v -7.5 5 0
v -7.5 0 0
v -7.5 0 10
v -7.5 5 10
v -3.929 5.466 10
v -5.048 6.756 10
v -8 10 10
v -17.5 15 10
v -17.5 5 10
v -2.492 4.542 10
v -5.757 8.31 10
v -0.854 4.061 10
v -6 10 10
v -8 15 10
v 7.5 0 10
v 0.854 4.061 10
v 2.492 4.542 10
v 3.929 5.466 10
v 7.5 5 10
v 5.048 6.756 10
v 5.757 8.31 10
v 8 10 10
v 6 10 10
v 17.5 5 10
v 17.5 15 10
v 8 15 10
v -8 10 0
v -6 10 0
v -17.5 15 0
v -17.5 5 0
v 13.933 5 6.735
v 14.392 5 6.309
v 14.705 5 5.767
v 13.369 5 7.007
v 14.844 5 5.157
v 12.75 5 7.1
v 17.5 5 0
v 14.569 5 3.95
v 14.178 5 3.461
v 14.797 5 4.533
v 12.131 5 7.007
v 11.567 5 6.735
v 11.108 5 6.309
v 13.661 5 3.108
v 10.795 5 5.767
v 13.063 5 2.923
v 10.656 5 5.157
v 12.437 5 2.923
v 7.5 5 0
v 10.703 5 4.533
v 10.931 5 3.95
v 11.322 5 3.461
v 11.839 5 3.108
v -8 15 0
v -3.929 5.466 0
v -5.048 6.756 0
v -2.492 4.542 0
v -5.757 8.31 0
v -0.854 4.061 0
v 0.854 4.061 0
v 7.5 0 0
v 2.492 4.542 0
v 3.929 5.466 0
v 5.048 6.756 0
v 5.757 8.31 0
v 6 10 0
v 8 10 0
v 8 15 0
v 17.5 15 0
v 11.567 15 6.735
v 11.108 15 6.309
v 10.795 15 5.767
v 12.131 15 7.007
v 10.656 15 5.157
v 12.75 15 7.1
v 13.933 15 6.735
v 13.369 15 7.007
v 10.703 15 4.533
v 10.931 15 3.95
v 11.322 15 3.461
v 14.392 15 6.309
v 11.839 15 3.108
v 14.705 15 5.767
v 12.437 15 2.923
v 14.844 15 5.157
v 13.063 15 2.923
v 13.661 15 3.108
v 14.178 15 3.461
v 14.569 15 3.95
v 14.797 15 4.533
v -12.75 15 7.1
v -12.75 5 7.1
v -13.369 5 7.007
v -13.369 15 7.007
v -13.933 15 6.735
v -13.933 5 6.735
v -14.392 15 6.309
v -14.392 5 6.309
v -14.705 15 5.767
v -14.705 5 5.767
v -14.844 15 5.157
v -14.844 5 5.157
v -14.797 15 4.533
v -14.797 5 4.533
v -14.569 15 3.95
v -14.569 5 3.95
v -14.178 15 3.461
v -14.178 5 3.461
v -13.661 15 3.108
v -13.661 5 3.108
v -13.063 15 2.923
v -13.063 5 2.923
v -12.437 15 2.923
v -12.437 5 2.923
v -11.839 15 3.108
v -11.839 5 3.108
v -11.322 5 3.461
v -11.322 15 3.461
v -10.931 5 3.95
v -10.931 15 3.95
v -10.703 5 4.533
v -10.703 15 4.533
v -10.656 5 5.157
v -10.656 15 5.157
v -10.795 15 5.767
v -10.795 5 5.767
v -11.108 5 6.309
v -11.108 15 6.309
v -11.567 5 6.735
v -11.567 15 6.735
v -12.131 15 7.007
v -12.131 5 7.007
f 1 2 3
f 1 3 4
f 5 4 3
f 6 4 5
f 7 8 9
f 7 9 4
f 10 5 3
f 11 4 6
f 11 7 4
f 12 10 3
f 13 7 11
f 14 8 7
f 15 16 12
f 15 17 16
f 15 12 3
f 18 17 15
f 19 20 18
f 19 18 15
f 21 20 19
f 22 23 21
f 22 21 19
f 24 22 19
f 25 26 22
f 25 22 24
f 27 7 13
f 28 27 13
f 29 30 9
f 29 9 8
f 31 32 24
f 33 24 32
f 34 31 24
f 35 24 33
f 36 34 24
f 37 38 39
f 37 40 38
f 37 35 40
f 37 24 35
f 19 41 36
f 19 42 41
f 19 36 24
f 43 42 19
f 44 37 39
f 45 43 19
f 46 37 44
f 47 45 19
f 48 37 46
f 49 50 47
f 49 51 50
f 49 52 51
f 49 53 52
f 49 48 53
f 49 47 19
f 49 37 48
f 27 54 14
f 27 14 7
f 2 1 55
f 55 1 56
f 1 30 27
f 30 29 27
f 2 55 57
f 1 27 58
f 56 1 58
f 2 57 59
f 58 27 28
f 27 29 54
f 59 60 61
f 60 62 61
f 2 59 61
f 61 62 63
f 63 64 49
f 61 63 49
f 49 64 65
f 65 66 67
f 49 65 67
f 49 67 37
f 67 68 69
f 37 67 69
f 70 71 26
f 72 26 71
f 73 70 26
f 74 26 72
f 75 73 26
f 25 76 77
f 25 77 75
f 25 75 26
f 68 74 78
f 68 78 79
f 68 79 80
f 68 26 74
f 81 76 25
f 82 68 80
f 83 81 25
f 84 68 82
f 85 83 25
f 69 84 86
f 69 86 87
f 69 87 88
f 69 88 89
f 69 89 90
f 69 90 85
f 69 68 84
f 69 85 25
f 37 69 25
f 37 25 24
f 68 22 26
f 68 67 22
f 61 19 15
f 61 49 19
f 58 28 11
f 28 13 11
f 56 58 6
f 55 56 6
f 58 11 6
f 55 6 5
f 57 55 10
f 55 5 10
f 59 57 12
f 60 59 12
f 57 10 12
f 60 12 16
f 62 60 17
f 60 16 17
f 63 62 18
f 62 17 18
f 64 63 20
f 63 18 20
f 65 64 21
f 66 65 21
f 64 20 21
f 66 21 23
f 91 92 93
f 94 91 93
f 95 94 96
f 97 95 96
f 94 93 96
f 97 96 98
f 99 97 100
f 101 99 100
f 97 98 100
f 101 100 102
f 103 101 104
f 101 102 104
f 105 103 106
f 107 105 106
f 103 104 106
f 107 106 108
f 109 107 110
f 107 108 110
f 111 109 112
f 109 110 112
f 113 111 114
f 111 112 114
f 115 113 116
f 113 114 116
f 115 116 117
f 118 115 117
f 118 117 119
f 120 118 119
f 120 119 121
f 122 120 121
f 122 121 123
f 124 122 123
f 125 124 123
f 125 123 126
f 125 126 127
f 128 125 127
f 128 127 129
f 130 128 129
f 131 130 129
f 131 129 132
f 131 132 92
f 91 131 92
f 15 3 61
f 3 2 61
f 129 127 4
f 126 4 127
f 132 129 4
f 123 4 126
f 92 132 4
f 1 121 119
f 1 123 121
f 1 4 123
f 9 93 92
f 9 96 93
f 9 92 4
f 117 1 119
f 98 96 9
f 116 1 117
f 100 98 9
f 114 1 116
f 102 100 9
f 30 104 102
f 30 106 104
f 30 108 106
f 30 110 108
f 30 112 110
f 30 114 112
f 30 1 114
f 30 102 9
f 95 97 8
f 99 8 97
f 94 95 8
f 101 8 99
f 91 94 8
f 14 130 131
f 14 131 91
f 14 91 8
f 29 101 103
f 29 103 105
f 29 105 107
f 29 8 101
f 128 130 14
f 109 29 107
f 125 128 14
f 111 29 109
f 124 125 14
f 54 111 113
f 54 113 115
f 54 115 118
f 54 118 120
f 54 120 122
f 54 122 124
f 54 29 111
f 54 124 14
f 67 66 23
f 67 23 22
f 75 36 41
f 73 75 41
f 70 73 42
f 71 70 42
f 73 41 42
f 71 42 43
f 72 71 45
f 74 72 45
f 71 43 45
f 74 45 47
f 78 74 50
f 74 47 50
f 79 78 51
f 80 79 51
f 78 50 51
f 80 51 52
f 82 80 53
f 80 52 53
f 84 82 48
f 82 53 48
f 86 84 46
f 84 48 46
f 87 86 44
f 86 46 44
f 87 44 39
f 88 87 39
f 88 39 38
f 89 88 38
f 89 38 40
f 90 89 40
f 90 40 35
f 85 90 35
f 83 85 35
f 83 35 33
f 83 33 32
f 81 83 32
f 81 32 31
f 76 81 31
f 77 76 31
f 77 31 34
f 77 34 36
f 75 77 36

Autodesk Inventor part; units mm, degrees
ref_plane "YZ Plane" through (0, 0, 0) normal (1, 0, 0) x (0, 1, 0)
ref_plane "XZ Plane" through (0, 0, 0) normal (0, 1, 0) x (-1, 0, 0)
ref_plane "XY Plane" through (0, 0, 0) normal (0, 0, 1) x (1, 0, 0)
sketch "Skizze1" plane through (0, 0, 0) normal (0, 0, 1) x (1, 0, 0)
  line L0 (-17.5, 5) -> (-17.5, 15)
  line L1 (-17.5, 15) -> (-8, 15)
  line L2 (-8, 15) -> (-8, 10)
  line L3 (-8, 10) -> (8, 10)
  line L4 (8, 10) -> (8, 15)
  line L5 (8, 15) -> (17.5, 15)
  line L6 (17.5, 15) -> (17.5, 5)
  line L7 (-7.5, 5) -> (-17.5, 5)
  line L8 (0, 10) -> (0, 0) construction
  line L9 (17.5, 5) -> (7.5, 5)
  line L10 (7.5, 5) -> (7.5, 0)
  line L11 (-7.5, 0) -> (-7.5, 5)
  line L12 (-7.5, 0) -> (7.5, 0)
  point P0 (-12.75, 15)
  dimension "d0" = 16
  dimension "d1" = 5
  dimension "d2" = 35
  dimension "d7" = 15
  dimension "d10" = 5
  dimension "d11" = 15
extrude "Extrusion1" add sketch "Skizze1" along normal blind 10
sketch "Skizze2" plane through (0, 0, 10) normal (0, 0, 1) x (1, 0, 0)
  line L0 (8, 10) -> (-8, 10) projected
  arc A0 (-6, 10) -> (6, 10) centre (0, 10) ccw
  point P0 (0, 0)
  dimension "d12" = 6
extrude "Extrusion2" cut sketch "Skizze2" against normal blind 10
sketch "Skizze3" plane through (-17.5, 15, 0) normal (0, 1, 0) x (1, 0, 0)
  line L0 (0, 0) -> (0, -10) projected
  line L1 (35, 0) -> (35, -10) projected
  line L2 (17.5, 0) -> (17.5, -10) construction
  point P0 (4.75, -5)
  point P1 (30.25, -5)
  point P2 (0, -5)
  point P3 (35, -5)
  dimension "d15" = 25.5
hole "Bohrung1" at (-12.75, 15, 5) at (12.75, 15, 5) direction (0, -1, 0) diameter 4.2 end through all
properties part number "Pleuel_Unterteil" material "Stahl, galvanisiert"
